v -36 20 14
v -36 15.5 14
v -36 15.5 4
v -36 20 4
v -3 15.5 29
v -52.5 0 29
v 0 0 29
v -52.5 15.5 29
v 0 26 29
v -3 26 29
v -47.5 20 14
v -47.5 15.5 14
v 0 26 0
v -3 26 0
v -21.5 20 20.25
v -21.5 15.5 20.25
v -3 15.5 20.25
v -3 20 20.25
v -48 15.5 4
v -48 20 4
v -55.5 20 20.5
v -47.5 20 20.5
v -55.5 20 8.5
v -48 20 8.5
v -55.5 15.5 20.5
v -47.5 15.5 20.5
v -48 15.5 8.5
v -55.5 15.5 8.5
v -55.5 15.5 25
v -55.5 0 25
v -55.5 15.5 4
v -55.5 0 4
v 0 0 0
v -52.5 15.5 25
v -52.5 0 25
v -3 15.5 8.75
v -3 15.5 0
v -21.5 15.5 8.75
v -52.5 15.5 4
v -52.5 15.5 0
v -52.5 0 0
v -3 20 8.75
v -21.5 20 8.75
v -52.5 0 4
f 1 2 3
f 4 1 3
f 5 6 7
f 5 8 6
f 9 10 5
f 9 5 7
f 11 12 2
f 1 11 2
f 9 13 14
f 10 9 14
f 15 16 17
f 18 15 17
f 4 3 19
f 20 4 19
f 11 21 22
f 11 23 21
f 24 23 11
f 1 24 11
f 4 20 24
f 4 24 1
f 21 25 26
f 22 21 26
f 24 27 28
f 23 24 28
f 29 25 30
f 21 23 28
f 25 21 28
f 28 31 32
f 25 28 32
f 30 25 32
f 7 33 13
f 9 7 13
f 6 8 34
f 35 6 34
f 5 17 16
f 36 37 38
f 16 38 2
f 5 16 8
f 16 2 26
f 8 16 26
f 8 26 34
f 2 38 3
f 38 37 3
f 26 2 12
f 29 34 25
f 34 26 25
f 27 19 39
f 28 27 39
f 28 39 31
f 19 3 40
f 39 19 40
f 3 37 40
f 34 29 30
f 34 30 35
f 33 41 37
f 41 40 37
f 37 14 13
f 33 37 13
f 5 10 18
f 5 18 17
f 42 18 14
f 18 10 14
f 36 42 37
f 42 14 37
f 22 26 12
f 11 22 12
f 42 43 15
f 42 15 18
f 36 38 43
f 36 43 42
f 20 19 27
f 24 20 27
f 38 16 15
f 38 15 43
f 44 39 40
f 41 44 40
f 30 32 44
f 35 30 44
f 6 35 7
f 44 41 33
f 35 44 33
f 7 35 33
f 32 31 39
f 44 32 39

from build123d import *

# Parameters (mm, degrees)
BOSS_EXTRUDE1_DEPTH = 29
SKETCH2_W           = 3
SKETCH2_H           = 4
CUT_EXTRUDE1_DEPTH  = 16.5
SKETCH3_W           = 18.5
SKETCH3_H           = 11.5
BOSS_EXTRUDE4_DEPTH = 4.5


with BuildPart() as part:
    # Sketch1 → Boss-Extrude1 (new body)
    with BuildSketch(Plane.XY):
        Polygon((0, 0), (0, 26), (-3, 26), (-3, 15.5), (-55.5, 15.5), (-55.5, 0), align=None)
    extrude(amount=BOSS_EXTRUDE1_DEPTH)

    # Sketch2 → Cut-Extrude1 (cut, through all)
    with BuildSketch(Plane(origin=(0, 15.5, 0), x_dir=(1, 0, 0), z_dir=(0, 1, 0))):
        with Locations((-54, -2)):
            Rectangle(SKETCH2_W, SKETCH2_H)
        with Locations((-54, -27)):
            Rectangle(SKETCH2_W, SKETCH2_H)
    extrude(amount=-CUT_EXTRUDE1_DEPTH, mode=Mode.SUBTRACT)

    # Sketch3 → Boss-Extrude4 (add)
    with BuildSketch(Plane(origin=(0, 15.5, 0), x_dir=(1, 0, 0), z_dir=(0, 1, 0))):
        with Locations((-12.25, -14.5)):
            Rectangle(SKETCH3_W, SKETCH3_H)
        Polygon((-55.5, -20.5), (-47.5, -20.5), (-47.5, -14), (-36, -14), (-36, -4), (-48, -4), (-48, -8.5), (-55.5, -8.5), align=None)
    extrude(amount=BOSS_EXTRUDE4_DEPTH)


solid = part.part
